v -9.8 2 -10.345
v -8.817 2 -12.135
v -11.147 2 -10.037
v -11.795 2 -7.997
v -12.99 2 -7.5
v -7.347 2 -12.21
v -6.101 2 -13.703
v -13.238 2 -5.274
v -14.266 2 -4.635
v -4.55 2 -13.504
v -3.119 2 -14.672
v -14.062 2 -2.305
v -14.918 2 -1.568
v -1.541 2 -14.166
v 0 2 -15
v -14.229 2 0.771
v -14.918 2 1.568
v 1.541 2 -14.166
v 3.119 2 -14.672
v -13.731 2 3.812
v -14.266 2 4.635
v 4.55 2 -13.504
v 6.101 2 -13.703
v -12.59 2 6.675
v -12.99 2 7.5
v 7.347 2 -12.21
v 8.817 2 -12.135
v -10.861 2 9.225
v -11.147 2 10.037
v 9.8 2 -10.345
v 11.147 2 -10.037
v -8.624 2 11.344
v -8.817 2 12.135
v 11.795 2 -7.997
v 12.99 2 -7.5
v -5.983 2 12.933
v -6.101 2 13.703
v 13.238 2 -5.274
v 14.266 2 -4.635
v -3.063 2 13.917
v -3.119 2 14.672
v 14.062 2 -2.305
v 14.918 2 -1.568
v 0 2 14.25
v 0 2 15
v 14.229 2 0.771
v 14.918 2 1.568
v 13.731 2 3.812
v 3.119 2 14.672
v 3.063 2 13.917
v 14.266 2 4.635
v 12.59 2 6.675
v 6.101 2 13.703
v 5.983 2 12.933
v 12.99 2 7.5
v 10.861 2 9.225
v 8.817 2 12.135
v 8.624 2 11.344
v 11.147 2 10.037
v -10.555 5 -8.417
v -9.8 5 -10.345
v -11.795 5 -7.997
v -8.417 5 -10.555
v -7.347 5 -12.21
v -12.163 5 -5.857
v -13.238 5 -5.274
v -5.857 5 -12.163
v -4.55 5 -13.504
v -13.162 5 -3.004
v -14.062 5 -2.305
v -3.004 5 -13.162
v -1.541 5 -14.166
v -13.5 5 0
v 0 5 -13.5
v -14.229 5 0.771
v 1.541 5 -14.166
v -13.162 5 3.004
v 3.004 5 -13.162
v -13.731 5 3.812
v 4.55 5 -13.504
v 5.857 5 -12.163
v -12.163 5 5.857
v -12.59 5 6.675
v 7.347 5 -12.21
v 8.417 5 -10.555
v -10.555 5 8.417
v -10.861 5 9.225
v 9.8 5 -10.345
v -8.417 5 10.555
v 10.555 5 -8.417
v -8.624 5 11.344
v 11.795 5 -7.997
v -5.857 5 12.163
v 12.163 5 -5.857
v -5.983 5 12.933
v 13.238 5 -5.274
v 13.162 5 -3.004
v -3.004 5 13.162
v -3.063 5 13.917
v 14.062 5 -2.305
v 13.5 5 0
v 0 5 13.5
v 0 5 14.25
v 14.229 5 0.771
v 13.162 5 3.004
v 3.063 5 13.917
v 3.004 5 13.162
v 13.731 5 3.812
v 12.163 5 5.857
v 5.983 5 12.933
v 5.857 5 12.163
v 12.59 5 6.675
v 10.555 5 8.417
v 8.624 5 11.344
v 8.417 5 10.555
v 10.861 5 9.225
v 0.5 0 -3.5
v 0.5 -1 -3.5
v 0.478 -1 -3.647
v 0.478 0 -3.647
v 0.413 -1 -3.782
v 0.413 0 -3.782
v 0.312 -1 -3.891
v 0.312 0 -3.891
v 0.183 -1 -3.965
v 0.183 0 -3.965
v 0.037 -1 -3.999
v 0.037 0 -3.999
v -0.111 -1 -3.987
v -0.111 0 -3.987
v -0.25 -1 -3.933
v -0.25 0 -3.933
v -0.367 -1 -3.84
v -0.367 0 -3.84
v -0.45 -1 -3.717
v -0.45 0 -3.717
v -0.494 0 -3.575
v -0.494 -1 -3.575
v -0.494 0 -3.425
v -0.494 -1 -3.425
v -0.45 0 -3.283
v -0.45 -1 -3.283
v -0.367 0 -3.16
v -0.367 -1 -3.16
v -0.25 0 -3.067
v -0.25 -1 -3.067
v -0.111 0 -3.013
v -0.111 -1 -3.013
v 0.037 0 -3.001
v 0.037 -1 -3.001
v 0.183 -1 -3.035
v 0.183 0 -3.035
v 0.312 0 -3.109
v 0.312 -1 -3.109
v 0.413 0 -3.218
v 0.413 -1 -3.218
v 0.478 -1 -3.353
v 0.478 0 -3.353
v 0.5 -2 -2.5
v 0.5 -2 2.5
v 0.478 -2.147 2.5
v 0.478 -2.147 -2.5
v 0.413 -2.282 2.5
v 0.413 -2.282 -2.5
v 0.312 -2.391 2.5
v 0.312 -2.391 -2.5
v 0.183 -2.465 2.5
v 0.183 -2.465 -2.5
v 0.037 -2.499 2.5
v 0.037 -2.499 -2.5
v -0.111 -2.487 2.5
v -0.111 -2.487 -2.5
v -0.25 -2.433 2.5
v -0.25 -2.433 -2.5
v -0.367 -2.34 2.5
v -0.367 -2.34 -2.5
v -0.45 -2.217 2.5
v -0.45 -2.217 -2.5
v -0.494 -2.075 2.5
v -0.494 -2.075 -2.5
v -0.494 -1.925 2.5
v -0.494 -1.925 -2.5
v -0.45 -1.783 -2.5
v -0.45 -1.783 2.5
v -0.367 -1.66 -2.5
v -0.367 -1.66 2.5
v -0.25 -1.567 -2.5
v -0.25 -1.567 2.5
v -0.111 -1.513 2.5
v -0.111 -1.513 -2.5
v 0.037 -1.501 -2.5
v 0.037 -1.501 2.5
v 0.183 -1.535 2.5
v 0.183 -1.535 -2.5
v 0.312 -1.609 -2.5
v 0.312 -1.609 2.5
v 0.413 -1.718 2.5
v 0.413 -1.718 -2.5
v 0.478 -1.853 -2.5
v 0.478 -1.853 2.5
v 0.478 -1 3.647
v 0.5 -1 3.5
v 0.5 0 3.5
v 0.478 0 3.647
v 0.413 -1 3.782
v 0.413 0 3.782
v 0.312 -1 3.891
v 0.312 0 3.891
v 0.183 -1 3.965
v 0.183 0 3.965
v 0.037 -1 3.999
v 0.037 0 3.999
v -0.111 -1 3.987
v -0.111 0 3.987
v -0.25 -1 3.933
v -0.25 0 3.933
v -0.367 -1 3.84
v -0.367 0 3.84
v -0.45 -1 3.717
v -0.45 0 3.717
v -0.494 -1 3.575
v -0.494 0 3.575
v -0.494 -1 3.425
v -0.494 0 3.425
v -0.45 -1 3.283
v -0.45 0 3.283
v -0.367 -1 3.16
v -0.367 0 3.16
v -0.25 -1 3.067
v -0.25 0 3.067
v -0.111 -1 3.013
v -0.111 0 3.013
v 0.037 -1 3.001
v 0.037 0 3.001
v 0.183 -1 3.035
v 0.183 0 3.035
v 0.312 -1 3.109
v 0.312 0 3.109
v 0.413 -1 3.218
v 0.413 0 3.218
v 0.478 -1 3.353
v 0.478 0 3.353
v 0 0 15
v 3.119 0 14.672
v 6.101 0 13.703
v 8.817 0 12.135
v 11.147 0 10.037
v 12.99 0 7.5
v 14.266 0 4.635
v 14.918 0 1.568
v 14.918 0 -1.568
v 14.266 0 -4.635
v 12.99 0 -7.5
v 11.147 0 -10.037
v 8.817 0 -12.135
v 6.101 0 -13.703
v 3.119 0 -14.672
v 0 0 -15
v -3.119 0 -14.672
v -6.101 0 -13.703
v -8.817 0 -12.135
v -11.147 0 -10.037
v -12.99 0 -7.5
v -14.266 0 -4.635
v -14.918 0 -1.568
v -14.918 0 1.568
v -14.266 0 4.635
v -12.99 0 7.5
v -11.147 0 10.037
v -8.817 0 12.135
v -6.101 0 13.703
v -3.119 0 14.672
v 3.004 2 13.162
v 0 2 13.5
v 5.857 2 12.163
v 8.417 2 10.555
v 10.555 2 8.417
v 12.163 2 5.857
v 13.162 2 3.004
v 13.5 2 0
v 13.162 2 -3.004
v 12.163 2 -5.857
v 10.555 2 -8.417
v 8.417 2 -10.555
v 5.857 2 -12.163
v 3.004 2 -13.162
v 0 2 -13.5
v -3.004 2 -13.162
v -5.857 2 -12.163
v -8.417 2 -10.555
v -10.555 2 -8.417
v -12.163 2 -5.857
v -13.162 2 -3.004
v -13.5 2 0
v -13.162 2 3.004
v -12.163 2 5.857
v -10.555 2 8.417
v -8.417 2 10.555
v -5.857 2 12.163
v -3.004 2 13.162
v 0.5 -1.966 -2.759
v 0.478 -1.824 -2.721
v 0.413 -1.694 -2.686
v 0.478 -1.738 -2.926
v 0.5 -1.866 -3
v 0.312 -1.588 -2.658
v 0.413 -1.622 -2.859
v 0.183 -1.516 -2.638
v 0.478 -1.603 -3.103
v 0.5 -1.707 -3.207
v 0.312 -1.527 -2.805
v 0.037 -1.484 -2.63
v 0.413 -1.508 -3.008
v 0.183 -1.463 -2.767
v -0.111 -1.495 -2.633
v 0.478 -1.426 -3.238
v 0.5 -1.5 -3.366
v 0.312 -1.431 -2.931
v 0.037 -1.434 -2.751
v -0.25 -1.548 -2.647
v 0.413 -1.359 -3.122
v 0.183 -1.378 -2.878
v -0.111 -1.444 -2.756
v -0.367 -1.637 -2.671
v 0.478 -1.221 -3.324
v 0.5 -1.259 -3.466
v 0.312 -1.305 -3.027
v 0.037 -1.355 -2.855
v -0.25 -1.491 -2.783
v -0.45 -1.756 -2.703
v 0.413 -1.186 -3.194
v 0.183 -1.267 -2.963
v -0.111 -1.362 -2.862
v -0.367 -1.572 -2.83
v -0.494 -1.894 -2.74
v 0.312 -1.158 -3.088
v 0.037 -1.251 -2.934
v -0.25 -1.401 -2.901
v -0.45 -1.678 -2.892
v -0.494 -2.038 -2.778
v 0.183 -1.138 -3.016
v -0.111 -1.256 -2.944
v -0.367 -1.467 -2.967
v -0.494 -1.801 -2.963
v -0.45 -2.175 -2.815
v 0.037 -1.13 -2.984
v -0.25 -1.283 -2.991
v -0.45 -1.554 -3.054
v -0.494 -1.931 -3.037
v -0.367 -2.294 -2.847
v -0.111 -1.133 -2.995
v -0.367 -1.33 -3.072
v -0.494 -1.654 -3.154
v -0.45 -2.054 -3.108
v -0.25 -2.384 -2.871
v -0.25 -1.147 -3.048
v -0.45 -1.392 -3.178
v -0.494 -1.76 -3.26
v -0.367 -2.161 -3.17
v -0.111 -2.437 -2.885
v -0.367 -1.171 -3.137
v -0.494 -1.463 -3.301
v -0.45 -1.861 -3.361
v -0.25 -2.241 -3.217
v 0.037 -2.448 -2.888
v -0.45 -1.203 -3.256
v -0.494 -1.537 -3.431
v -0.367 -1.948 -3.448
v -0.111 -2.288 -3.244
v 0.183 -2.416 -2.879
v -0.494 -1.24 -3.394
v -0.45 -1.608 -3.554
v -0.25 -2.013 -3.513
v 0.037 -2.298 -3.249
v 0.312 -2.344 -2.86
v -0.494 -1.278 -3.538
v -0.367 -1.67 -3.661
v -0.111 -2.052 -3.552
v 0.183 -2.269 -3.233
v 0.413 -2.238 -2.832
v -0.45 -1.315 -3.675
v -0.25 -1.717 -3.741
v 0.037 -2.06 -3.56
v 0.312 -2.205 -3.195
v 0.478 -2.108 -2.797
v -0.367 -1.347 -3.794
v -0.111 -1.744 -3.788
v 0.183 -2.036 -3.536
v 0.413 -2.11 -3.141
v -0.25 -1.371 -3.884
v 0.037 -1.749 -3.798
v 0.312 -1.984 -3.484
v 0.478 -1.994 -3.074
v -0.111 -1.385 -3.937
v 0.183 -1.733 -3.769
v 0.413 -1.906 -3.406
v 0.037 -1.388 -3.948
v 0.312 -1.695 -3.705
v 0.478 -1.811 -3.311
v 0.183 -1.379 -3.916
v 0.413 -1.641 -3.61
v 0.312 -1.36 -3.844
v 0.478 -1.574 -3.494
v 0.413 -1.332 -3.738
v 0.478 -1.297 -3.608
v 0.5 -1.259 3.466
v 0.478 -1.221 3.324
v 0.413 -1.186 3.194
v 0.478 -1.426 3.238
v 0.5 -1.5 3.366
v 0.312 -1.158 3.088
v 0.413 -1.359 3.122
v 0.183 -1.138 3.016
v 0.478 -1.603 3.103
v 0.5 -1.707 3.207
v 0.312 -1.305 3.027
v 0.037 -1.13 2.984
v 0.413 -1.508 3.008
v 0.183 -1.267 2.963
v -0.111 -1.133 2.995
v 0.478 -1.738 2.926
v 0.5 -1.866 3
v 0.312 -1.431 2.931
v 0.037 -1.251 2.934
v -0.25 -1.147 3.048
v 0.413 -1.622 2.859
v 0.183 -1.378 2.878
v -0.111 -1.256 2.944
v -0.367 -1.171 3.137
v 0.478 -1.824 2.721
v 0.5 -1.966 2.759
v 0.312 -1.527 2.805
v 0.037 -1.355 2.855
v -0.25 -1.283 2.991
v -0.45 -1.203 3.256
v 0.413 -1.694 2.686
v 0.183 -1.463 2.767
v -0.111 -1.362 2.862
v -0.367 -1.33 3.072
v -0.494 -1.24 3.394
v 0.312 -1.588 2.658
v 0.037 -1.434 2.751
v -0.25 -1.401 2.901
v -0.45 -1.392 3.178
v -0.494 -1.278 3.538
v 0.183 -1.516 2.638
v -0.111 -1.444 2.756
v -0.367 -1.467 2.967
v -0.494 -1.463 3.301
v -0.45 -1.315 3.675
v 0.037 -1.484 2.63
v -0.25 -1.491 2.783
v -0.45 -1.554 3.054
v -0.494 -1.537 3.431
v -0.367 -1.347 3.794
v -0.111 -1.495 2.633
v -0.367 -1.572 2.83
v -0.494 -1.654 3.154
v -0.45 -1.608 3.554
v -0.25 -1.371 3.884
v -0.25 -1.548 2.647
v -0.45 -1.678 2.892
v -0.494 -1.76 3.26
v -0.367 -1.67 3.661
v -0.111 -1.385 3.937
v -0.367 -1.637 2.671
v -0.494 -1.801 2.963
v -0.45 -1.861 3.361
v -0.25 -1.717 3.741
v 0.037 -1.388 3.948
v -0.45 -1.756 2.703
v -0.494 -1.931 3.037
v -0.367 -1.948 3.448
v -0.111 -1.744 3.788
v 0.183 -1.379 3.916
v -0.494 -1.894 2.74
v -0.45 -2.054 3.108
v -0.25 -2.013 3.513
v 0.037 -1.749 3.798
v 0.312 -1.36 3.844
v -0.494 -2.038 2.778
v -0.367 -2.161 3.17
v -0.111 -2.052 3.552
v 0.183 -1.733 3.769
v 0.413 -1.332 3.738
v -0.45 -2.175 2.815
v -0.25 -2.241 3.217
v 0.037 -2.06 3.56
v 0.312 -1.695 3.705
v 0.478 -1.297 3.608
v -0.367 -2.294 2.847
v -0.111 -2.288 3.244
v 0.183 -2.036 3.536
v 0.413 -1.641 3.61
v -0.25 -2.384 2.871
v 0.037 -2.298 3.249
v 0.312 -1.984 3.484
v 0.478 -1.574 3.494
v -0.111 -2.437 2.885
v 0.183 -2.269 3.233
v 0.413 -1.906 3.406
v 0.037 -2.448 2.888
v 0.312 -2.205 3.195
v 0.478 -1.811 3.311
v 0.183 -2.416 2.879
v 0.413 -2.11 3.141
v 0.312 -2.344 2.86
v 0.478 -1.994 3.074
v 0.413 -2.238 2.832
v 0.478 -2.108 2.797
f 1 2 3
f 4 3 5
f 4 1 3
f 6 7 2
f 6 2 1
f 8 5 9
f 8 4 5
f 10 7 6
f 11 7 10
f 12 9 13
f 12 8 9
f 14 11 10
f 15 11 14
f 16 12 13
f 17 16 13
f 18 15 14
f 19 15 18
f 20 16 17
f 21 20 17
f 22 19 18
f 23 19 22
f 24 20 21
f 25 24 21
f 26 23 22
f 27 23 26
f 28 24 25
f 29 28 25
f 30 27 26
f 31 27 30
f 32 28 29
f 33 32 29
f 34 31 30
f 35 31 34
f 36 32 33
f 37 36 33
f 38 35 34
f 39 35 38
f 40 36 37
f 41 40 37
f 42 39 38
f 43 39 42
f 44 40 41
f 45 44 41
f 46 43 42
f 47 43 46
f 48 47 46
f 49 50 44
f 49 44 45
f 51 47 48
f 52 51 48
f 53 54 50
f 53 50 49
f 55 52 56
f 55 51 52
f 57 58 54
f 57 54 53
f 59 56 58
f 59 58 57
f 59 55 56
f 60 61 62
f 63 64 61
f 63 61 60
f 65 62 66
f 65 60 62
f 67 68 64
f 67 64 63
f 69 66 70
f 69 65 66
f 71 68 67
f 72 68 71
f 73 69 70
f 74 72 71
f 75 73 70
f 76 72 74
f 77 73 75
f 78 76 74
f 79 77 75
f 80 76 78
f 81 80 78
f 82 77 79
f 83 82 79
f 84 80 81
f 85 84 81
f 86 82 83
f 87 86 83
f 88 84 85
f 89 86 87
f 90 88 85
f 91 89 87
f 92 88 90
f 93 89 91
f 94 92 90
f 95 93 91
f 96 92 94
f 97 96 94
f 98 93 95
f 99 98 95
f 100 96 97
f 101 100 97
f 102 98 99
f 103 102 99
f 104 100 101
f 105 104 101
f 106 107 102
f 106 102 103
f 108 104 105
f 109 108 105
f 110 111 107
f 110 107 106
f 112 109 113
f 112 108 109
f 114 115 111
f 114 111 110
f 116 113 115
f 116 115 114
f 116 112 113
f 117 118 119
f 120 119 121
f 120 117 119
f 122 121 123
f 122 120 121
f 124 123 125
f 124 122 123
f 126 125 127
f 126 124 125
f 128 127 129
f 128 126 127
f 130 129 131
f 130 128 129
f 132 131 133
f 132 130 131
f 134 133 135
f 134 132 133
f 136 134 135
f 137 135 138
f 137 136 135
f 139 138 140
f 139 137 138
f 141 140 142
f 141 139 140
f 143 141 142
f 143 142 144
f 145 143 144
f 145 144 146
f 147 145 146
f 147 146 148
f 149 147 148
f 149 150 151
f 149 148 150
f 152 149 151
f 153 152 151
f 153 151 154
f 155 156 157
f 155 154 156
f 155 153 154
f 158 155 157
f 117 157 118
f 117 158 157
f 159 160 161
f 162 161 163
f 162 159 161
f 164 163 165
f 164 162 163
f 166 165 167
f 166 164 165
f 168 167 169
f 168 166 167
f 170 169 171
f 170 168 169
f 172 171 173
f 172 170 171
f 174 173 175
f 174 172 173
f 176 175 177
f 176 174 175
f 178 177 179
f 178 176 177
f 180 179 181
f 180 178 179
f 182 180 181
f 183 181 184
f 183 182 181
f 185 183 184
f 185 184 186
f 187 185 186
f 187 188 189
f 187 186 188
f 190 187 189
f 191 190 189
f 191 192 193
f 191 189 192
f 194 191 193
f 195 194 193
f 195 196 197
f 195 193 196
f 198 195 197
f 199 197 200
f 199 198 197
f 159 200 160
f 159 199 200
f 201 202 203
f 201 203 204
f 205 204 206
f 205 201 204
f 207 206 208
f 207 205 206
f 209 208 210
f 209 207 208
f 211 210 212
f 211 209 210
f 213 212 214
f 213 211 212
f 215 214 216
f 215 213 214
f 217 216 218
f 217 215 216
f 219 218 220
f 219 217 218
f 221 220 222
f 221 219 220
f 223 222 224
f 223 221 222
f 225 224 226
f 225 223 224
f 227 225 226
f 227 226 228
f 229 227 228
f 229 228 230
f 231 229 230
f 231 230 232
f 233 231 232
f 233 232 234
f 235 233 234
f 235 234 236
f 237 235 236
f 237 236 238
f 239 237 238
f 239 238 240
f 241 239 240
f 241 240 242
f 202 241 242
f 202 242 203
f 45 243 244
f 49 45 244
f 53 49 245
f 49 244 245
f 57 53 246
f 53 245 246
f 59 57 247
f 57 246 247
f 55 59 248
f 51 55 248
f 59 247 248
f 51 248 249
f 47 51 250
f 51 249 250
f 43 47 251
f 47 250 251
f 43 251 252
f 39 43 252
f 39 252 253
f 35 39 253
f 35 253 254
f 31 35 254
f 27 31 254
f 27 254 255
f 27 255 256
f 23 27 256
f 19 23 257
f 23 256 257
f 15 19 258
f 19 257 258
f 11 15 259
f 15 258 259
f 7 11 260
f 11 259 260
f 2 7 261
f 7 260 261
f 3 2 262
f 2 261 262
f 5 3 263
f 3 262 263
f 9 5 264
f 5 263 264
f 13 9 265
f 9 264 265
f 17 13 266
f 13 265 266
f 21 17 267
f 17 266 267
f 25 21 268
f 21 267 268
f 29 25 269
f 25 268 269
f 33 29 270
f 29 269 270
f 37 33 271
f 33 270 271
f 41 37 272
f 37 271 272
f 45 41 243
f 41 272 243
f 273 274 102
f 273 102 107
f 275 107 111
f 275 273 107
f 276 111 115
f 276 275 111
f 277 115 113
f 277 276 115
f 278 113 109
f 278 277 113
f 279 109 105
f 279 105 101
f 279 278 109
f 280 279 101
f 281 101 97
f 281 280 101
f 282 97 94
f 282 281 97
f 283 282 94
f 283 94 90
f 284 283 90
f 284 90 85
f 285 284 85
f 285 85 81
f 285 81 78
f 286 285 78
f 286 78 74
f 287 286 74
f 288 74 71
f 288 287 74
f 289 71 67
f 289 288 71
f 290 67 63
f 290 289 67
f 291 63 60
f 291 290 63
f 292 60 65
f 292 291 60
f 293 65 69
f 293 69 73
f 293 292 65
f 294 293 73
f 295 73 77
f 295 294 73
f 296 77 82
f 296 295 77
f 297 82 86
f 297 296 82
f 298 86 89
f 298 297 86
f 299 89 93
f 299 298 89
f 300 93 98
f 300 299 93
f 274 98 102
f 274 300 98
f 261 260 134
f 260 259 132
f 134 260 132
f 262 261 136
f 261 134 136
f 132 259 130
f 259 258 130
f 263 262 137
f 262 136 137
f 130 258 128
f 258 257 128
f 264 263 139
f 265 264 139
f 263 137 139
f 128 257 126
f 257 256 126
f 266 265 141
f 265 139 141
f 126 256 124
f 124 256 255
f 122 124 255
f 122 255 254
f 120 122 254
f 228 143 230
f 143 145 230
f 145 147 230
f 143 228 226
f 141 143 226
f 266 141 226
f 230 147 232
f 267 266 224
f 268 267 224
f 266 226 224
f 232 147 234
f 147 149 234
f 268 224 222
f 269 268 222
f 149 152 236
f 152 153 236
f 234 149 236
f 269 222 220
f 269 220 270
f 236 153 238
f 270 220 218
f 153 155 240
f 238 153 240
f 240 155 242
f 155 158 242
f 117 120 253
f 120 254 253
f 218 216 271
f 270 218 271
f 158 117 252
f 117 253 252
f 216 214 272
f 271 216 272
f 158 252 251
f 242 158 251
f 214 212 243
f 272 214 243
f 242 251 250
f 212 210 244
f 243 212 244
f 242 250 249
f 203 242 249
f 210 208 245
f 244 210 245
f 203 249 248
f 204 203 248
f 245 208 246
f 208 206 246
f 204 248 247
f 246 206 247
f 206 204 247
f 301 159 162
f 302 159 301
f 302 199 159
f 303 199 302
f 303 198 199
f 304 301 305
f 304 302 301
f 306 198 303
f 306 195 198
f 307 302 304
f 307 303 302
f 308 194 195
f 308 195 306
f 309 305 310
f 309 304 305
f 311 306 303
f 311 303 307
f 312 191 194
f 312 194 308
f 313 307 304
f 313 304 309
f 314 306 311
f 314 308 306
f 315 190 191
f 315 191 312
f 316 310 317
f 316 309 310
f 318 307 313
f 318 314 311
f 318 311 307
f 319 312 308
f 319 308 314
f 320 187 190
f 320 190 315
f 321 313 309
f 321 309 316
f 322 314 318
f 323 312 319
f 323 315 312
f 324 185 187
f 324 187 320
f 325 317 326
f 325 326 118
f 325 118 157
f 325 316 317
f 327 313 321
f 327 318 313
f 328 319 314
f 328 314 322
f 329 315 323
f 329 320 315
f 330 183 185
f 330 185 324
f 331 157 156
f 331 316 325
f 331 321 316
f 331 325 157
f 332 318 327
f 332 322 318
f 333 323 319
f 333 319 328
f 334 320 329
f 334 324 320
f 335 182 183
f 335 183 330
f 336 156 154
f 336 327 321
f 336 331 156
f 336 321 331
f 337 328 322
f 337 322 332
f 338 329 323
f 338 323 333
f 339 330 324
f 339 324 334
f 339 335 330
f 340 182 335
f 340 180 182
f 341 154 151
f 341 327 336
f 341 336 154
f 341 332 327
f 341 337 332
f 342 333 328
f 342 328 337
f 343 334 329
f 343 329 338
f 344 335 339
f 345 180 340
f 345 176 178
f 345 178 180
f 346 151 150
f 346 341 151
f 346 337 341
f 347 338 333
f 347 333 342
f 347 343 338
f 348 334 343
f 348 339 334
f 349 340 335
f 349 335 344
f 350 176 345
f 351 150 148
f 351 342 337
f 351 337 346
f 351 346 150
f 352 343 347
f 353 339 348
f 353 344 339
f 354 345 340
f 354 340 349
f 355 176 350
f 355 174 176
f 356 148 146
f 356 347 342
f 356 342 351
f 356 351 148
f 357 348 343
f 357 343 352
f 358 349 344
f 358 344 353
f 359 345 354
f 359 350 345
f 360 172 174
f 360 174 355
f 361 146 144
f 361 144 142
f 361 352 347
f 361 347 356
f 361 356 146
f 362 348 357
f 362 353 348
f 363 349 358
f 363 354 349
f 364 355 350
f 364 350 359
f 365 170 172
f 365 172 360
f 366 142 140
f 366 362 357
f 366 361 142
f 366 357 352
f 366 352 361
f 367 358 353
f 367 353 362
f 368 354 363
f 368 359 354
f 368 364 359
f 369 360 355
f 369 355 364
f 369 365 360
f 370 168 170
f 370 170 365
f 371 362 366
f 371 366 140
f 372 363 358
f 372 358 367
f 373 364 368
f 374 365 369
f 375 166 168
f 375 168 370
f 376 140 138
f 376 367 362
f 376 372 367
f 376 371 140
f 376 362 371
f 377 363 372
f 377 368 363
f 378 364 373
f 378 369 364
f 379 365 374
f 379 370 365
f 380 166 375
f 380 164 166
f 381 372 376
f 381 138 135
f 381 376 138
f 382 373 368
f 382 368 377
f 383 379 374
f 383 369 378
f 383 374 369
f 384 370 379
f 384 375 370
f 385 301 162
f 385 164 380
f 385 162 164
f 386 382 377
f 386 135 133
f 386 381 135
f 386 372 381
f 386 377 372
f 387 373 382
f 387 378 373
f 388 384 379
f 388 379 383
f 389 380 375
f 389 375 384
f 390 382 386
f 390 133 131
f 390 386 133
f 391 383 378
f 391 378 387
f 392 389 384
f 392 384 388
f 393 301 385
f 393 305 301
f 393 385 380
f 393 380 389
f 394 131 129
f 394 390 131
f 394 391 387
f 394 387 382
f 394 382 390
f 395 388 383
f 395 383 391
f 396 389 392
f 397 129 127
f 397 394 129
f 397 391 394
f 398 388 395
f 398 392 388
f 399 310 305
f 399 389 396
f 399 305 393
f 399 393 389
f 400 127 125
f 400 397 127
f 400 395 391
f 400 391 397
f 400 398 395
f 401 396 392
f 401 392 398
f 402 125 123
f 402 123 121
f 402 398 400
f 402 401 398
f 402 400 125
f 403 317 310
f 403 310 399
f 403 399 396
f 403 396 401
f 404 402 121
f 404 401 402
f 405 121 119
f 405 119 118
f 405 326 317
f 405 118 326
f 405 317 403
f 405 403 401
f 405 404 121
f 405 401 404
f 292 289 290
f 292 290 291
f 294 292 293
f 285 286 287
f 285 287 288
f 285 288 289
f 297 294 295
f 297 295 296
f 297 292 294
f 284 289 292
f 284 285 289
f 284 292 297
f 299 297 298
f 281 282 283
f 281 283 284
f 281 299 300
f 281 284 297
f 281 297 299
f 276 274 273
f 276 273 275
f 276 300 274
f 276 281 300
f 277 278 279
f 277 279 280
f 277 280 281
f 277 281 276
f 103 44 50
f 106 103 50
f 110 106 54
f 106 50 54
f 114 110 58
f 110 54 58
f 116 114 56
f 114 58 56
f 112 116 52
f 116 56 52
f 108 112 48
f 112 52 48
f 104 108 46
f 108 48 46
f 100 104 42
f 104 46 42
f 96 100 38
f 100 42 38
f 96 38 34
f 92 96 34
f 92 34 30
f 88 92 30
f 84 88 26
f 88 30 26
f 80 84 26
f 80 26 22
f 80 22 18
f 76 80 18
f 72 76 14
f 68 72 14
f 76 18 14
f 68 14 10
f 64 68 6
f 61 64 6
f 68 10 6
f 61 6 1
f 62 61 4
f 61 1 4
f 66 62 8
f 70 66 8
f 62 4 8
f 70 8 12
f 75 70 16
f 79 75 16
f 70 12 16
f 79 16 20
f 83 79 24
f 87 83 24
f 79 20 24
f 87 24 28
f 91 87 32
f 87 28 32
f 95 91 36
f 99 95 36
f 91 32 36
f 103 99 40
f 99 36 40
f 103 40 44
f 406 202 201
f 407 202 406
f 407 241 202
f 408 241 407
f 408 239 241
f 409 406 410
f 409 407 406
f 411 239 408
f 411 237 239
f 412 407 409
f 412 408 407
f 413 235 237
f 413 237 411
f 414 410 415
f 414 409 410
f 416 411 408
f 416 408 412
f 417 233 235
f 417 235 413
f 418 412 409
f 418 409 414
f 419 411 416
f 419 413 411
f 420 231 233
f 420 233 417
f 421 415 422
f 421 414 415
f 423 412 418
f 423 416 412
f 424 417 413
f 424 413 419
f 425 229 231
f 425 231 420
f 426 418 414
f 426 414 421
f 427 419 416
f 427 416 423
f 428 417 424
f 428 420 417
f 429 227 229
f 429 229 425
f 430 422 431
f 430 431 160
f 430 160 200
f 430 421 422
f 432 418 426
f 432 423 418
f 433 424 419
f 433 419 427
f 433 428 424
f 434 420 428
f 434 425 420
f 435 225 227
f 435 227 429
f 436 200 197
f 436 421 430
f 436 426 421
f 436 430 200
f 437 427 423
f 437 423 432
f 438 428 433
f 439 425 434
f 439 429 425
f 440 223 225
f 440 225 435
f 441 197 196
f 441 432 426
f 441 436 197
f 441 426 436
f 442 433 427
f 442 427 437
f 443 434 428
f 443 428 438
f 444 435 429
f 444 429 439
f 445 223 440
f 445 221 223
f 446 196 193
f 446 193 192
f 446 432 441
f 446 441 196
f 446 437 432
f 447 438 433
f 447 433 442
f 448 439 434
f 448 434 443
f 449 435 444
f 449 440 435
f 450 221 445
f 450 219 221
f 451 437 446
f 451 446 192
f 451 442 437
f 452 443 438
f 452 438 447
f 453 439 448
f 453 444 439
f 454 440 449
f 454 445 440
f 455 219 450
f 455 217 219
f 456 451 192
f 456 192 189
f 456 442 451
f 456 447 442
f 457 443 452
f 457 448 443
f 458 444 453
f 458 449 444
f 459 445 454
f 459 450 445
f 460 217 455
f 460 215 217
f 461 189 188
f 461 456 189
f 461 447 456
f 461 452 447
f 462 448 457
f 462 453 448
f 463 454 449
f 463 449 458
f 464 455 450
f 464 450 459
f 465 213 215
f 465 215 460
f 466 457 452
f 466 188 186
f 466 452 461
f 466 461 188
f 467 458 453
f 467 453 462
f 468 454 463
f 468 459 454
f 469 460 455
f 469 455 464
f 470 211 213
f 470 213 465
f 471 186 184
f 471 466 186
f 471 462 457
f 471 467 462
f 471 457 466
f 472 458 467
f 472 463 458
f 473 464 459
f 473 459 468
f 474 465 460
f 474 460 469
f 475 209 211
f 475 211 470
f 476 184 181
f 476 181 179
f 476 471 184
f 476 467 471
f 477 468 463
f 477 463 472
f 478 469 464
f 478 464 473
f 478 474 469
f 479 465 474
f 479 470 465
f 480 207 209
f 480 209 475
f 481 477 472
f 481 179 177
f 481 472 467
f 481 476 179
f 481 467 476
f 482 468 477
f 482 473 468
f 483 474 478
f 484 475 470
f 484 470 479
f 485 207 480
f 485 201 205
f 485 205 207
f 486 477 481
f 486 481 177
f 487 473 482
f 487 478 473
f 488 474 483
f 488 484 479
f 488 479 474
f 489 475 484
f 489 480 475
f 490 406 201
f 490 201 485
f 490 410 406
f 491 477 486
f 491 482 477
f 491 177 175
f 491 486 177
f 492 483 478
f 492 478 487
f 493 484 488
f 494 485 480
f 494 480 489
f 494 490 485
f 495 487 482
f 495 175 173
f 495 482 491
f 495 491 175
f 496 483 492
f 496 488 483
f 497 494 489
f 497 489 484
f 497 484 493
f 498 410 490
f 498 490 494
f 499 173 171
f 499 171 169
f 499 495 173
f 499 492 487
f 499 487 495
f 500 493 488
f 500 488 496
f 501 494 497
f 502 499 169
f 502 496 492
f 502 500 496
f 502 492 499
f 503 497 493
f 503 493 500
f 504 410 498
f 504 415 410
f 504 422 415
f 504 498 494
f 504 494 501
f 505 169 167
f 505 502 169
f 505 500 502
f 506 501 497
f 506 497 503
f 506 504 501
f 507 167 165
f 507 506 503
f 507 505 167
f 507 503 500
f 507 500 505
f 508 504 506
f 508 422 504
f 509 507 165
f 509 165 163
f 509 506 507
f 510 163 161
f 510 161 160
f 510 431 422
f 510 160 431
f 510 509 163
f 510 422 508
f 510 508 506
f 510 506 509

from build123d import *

# Parameters (mm, degrees)
SKETCH1_R           = 15
BOSS_EXTRUDE3_DEPTH = 2
SKETCH2_R           = 14.25
SKETCH2_R_2         = 13.5
BOSS_EXTRUDE4_DEPTH = 3
SKETCH6_R           = 0.5


with BuildPart() as part:
    # Sketch1 → Boss-Extrude3 (new body)
    with BuildSketch(Plane(origin=(0, 0, 0), x_dir=(1, 0, 0), z_dir=(0, 1, 0))):
        with Locations(Location((0, 0, 0), (0, 0, 270))):
            Circle(SKETCH1_R)
    extrude(amount=BOSS_EXTRUDE3_DEPTH)

    # Sketch2 → Boss-Extrude4 (add)
    with BuildSketch(Plane(origin=(0, 2, 0), x_dir=(1, 0, 0), z_dir=(0, 1, 0))):
        with Locations(Location((0, 0, 0), (0, 0, 270))):
            Circle(SKETCH2_R)
        with Locations(Location((0, 0, 0), (0, 0, 270))):
            Circle(SKETCH2_R_2, mode=Mode.SUBTRACT)
    extrude(amount=BOSS_EXTRUDE4_DEPTH)

    # Sweep1: sweep along a path in Sketch7
    with BuildLine(Plane(origin=(0, 0, 0), x_dir=(0, 0, -1), z_dir=(1, 0, 0))) as sweep1_path:
        Line((-3.5, 0), (-3.5, -1))
        ThreePointArc((-3.5, -1), (-3.207106781, -1.707106781), (-2.5, -2))
        Line((-2.5, -2), (2.5, -2))
        ThreePointArc((2.5, -2), (3.207106781, -1.707106781), (3.5, -1))
        Line((3.5, -1), (3.5, 0))
    # Sketch6 → Sweep1 (sweep)
    with BuildSketch(Plane.XZ):
        with Locations((0, 3.5)):
            Circle(SKETCH6_R)
    sweep(path=sweep1_path.line)


solid = part.part
